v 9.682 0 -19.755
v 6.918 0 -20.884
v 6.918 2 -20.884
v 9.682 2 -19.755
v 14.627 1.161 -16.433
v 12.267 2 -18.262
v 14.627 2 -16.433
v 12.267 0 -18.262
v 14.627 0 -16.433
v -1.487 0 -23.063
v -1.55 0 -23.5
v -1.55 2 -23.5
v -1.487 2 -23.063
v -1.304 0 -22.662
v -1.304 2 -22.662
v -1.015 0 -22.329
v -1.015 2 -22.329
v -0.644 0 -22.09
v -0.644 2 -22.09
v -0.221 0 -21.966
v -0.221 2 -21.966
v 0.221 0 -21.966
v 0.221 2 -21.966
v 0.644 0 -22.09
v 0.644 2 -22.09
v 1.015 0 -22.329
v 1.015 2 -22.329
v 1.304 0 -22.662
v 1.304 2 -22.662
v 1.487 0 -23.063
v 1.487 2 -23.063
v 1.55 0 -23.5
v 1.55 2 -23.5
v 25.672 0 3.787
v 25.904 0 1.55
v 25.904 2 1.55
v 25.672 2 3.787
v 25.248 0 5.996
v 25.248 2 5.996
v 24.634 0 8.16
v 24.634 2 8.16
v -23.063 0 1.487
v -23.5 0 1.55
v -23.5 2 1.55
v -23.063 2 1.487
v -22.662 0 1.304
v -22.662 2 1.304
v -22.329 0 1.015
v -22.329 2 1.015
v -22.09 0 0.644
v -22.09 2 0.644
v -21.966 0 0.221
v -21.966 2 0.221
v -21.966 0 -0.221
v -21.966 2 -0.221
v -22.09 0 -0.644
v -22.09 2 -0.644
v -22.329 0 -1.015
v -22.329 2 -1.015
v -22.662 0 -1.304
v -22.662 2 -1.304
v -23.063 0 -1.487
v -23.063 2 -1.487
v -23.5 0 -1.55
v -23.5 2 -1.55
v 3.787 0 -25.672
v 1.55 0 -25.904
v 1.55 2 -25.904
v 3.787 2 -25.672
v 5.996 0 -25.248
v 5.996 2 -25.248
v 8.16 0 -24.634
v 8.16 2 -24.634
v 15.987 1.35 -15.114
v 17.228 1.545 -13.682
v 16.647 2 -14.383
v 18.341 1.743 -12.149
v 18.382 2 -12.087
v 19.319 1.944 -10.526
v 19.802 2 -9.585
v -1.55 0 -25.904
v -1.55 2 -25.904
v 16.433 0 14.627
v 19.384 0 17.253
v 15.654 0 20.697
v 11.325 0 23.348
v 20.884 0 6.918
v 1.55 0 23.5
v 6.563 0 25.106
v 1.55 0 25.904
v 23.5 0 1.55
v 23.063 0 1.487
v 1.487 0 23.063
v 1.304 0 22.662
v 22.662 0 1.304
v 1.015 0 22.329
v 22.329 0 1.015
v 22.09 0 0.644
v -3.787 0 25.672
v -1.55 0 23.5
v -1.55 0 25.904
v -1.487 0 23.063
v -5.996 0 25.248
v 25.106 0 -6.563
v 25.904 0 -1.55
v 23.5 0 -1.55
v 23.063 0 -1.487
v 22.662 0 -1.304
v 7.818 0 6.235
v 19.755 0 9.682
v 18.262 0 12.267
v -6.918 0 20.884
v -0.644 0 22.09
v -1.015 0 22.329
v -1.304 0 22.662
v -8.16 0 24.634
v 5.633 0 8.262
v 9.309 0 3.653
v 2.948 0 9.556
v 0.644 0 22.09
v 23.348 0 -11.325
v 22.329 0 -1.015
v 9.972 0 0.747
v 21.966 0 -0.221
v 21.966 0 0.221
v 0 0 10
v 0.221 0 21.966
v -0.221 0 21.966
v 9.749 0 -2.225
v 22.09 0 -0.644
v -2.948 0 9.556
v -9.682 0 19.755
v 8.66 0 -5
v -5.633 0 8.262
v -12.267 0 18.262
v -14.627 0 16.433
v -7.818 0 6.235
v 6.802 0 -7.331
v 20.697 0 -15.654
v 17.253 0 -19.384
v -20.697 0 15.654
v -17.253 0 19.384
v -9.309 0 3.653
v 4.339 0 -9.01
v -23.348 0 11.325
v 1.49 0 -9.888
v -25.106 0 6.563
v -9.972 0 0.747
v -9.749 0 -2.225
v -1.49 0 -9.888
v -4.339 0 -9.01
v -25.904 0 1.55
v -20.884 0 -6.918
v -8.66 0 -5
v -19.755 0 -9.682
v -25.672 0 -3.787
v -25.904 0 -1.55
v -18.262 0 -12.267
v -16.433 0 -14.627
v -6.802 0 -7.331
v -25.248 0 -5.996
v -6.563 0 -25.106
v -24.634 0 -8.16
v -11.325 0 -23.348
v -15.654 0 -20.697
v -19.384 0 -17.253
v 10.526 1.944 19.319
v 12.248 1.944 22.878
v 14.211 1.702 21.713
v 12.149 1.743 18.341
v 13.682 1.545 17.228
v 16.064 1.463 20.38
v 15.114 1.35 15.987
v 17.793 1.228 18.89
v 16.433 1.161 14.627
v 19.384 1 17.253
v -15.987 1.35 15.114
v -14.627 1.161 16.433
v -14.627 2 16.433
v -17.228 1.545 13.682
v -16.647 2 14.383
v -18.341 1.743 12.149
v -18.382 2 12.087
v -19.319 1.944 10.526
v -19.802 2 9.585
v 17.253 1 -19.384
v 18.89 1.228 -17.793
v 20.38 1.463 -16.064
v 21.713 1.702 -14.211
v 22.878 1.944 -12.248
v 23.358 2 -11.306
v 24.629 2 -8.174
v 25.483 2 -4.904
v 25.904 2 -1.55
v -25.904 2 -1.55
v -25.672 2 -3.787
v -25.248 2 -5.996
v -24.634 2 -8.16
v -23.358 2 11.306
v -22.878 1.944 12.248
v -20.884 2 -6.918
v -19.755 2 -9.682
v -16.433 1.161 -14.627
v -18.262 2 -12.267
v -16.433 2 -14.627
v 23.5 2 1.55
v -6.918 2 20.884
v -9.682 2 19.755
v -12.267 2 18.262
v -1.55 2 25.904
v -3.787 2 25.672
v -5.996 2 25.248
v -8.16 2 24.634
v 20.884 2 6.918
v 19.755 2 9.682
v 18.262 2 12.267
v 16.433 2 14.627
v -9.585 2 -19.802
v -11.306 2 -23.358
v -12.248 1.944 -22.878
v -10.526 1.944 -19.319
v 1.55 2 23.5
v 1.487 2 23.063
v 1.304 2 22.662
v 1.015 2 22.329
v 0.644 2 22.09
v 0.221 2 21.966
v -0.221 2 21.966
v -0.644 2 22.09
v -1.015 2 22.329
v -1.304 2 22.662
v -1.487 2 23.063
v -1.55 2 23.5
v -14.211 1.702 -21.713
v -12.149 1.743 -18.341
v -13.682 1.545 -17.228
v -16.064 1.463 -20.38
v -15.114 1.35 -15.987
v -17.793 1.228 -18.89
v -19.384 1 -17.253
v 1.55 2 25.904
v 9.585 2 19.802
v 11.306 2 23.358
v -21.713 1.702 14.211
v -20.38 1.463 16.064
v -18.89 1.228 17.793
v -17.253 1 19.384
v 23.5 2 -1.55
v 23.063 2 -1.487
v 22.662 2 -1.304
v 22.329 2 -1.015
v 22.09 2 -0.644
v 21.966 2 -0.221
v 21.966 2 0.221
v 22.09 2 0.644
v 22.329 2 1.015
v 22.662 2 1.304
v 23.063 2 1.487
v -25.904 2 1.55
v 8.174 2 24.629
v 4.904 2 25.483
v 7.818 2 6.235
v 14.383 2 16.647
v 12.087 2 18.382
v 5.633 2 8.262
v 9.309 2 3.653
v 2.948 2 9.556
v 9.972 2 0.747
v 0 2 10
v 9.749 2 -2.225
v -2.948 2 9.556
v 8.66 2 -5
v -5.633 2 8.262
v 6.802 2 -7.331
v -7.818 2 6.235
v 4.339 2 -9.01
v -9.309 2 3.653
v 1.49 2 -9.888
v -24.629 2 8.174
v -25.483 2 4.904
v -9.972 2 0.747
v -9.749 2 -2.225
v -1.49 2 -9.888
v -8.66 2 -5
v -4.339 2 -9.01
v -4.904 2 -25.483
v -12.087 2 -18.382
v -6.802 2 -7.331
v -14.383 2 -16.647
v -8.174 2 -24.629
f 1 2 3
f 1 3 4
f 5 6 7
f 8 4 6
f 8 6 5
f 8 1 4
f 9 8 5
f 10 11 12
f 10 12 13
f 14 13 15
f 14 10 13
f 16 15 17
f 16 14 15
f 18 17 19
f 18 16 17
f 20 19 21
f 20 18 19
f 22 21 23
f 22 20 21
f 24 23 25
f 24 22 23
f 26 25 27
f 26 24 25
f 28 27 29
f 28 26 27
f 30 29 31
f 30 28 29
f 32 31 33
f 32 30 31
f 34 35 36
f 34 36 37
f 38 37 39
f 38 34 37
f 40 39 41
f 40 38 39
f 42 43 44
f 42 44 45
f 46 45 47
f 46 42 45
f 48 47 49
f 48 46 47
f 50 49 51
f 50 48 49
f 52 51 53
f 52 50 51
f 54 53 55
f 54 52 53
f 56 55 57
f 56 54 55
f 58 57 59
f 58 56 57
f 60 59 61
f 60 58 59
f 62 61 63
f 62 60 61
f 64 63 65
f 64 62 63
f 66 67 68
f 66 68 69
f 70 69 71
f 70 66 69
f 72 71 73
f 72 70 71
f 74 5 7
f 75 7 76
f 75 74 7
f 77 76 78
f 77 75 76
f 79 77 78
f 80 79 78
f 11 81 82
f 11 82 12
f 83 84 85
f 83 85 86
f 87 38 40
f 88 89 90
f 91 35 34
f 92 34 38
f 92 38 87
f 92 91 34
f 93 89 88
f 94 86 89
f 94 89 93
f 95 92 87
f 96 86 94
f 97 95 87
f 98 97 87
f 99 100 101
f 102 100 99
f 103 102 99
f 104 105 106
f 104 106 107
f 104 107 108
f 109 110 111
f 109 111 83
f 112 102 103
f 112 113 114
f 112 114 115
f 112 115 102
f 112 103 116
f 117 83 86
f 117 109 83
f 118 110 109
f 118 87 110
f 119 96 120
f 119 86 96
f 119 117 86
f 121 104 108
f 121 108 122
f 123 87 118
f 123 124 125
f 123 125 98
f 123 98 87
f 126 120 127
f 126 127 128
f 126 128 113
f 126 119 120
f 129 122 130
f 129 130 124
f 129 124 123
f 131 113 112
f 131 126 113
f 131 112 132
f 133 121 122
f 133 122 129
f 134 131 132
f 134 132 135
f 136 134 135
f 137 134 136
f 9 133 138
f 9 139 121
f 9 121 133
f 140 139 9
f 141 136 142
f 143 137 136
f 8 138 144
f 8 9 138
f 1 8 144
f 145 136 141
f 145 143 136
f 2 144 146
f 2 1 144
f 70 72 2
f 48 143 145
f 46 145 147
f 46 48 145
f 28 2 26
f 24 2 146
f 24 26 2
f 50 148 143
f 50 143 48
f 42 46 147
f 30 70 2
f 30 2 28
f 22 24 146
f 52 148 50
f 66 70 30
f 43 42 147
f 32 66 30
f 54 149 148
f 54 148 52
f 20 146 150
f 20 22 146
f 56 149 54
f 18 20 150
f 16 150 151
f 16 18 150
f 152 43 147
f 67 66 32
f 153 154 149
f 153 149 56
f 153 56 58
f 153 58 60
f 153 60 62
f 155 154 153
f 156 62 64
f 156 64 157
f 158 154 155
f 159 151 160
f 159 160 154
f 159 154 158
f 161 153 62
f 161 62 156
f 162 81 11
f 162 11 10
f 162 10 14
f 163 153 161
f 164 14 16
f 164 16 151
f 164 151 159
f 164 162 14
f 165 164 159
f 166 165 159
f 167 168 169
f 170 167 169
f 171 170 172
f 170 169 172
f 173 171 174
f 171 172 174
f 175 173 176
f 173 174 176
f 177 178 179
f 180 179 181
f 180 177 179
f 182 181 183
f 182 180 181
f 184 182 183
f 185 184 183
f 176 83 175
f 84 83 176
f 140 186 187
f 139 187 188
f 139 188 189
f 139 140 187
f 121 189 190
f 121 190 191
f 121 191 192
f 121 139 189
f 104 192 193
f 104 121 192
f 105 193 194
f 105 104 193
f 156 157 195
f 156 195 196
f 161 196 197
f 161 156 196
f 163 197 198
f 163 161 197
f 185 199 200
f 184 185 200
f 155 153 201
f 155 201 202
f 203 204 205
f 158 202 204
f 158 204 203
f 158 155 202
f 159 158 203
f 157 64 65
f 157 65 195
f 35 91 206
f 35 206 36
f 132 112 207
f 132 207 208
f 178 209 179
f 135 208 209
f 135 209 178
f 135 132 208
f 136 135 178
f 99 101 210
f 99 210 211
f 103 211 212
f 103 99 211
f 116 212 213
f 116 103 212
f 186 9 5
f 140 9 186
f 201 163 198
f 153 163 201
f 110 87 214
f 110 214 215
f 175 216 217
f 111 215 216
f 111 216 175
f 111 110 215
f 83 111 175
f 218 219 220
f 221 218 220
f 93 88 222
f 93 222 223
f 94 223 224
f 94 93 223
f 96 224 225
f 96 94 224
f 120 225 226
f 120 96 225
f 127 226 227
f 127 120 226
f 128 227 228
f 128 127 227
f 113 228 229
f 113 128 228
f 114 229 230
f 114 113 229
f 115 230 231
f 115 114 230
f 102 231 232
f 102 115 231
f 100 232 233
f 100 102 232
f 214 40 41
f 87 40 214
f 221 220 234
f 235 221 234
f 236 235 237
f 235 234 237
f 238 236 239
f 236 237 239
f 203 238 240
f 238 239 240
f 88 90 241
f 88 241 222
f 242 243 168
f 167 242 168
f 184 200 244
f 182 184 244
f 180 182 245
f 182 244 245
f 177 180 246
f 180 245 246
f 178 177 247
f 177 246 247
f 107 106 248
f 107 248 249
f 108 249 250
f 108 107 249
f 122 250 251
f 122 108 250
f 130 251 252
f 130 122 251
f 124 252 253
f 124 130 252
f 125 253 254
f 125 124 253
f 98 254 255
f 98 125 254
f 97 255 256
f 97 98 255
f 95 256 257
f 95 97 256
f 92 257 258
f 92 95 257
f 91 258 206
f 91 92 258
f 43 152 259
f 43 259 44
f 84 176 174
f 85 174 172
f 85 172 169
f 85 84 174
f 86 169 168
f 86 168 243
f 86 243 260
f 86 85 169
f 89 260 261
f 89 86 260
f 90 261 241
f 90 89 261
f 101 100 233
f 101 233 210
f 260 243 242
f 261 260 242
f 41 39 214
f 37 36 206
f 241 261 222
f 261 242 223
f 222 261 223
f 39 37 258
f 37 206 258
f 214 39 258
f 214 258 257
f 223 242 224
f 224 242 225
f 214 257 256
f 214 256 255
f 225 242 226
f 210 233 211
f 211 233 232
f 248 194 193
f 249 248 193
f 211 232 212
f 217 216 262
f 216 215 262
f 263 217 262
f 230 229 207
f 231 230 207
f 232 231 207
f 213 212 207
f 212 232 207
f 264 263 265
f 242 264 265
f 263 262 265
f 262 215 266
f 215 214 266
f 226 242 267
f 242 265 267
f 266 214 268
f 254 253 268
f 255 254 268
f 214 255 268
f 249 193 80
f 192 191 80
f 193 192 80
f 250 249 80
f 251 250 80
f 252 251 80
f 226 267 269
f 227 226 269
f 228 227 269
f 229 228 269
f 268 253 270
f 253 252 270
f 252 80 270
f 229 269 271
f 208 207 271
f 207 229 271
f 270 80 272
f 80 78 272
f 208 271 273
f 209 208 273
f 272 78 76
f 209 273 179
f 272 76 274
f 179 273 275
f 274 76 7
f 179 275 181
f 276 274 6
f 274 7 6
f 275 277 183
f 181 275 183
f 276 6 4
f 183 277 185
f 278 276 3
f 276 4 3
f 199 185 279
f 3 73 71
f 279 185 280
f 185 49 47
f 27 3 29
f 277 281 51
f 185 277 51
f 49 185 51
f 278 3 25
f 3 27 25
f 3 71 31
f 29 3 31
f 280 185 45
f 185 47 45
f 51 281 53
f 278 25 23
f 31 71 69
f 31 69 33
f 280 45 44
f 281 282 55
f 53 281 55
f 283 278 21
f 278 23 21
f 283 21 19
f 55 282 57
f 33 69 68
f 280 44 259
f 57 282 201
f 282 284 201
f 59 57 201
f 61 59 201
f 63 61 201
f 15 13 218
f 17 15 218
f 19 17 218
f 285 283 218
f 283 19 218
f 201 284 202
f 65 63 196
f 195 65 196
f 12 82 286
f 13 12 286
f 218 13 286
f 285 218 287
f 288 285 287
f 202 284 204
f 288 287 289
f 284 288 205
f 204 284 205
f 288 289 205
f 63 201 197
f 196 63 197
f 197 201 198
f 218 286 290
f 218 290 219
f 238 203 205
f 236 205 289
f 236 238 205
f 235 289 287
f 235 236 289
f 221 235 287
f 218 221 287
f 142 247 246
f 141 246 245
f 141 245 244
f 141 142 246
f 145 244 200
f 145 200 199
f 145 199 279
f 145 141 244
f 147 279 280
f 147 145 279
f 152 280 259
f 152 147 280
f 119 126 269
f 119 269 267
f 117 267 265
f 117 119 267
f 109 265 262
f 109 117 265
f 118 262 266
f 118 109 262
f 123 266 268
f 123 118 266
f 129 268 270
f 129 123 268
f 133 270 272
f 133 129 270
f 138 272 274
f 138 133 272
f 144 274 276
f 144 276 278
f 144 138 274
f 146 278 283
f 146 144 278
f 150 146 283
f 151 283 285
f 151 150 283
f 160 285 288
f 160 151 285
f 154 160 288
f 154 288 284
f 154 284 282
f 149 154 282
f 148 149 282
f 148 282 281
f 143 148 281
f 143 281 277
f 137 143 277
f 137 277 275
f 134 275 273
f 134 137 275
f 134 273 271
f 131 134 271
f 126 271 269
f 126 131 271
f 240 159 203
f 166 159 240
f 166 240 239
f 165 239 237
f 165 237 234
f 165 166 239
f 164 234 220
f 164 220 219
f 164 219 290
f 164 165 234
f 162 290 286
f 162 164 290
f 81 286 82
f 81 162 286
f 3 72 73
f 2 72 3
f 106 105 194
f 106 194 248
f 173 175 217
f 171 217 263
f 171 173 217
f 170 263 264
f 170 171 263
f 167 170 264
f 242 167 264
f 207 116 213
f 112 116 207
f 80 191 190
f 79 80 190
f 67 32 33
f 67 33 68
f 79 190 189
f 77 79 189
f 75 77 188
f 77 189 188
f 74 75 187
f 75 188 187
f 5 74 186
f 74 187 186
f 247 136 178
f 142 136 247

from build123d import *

# Parameters (mm, degrees)
ESQUISSE2_R                  = 10
BOSS_EXTRU_1_DEPTH           = 2
ENL_V_MAT_EXTRU_1_REACH      = 63.767
ENL_V_MAT_EXTRU_1_END_RADIUS = 22
R_P_TITION_CIRCULAIRE1_COUNT = 4


with BuildPart() as part:
    # Esquisse2 → Boss.-Extru.1 (new body)
    with BuildSketch(Plane(origin=(0, 0, 0), x_dir=(1, 0, 0), z_dir=(0, 1, 0))):
        with BuildLine():
            Line((-1.55, 25.903667694), (-1.55, 23.5))
            ThreePointArc((-1.55, 23.5), (0, 21.95), (1.55, 23.5))
            Line((1.55, 23.5), (1.55, 25.903667694))
            ThreePointArc((1.55, 25.903667694), (4.89638147, 25.483876246), (8.160057781, 24.633634669))
            Line((8.160057781, 24.633634669), (6.917968061, 20.884006271))
            ThreePointArc((6.917968061, 20.884006271), (11, 19.052558883), (14.627095933, 16.433139219))
            Line((14.627095933, 16.433139219), (17.253324521, 19.383634669))
            ThreePointArc((17.253324521, 19.383634669), (23.348257443, 11.325253832), (25.903667694, 1.55))
            Line((25.903667694, 1.55), (23.5, 1.55))
            ThreePointArc((23.5, 1.55), (21.95, 0), (23.5, -1.55))
            Line((23.5, -1.55), (25.903667694, -1.55))
            ThreePointArc((25.903667694, -1.55), (25.483876246, -4.89638147), (24.633634669, -8.160057781))
            Line((24.633634669, -8.160057781), (20.884006271, -6.917968061))
            ThreePointArc((20.884006271, -6.917968061), (19.052558883, -11), (16.433139219, -14.627095933))
            Line((16.433139219, -14.627095933), (19.383634669, -17.253324521))
            ThreePointArc((19.383634669, -17.253324521), (11.325253832, -23.348257443), (1.55, -25.903667694))
            Line((1.55, -25.903667694), (1.55, -23.5))
            ThreePointArc((1.55, -23.5), (0, -21.95), (-1.55, -23.5))
            Line((-1.55, -23.5), (-1.55, -25.903667694))
            ThreePointArc((-1.55, -25.903667694), (-4.89638147, -25.483876246), (-8.160057781, -24.633634669))
            Line((-8.160057781, -24.633634669), (-6.917968061, -20.884006271))
            ThreePointArc((-6.917968061, -20.884006271), (-11, -19.052558883), (-14.627095933, -16.433139219))
            Line((-14.627095933, -16.433139219), (-17.253324521, -19.383634669))
            ThreePointArc((-17.253324521, -19.383634669), (-23.348257443, -11.325253832), (-25.903667694, -1.55))
            Line((-25.903667694, -1.55), (-23.5, -1.55))
            ThreePointArc((-23.5, -1.55), (-21.95, 0), (-23.5, 1.55))
            Line((-23.5, 1.55), (-25.903667694, 1.55))
            ThreePointArc((-25.903667694, 1.55), (-25.483876246, 4.89638147), (-24.633634669, 8.160057781))
            Line((-24.633634669, 8.160057781), (-20.884006271, 6.917968061))
            ThreePointArc((-20.884006271, 6.917968061), (-19.052558883, 11), (-16.433139219, 14.627095933))
            Line((-16.433139219, 14.627095933), (-19.383634669, 17.253324521))
            ThreePointArc((-19.383634669, 17.253324521), (-11.325253832, 23.348257443), (-1.55, 25.903667694))
        make_face()
        with Locations(Location((0, 0, 0), (0, 0, 270))):
            Circle(ESQUISSE2_R, mode=Mode.SUBTRACT)
    extrude(amount=BOSS_EXTRU_1_DEPTH)

    # Enlèv. mat.-Extru.1: up to this cylinder (the profile starts outside it)
    enl_v_mat_extru_1_end = Plane(origin=(0, 2.23221, 0), z_dir=(0, -1, 0)) * Cylinder(ENL_V_MAT_EXTRU_1_END_RADIUS, 172.534, mode=Mode.PRIVATE)
    # Esquisse4 → Enlèv. mat.-Extru.1 (cut, up to the surface)
    with BuildSketch(Plane(origin=(23.357789239, 0, -11.305581889), x_dir=(-0.43566789553954177, 0, -0.9001074851350516), z_dir=(0.9001074851350516, 0, -0.43566789553954177)), mode=Mode.PRIVATE) as enl_v_mat_extru_1_sk1:
        with BuildLine():
            Line((9.93063507, 1), (9.93063507, 3))
            Line((9.93063507, 3), (0, 3))
            Line((0, 3), (0, 2))
            ThreePointArc((0, 2), (0.52966098, 1.985963111), (1.057835001, 1.943891849))
            Line((1.057835001, 1.943891849), (9.93063507, 1))
        make_face()
    enl_v_mat_extru_1_tool1 = extrude(enl_v_mat_extru_1_sk1.sketch, amount=-ENL_V_MAT_EXTRU_1_REACH, mode=Mode.PRIVATE) - enl_v_mat_extru_1_end
    enl_v_mat_extru_1 = enl_v_mat_extru_1_tool1.solids().sort_by_distance((20.938912, 2.23221, -16.303079))[0]
    add(enl_v_mat_extru_1, mode=Mode.SUBTRACT)

    # Répétition circulaire1: Enlèv. mat.-Extru.1 ×4 about axis
    r_p_tition_circulaire1_axis = Axis((0, 0, 0), (0, 1, 0))
    for i in range(1, R_P_TITION_CIRCULAIRE1_COUNT):
        add(enl_v_mat_extru_1.rotate(r_p_tition_circulaire1_axis, i * 360 / R_P_TITION_CIRCULAIRE1_COUNT), mode=Mode.SUBTRACT)


solid = part.part
